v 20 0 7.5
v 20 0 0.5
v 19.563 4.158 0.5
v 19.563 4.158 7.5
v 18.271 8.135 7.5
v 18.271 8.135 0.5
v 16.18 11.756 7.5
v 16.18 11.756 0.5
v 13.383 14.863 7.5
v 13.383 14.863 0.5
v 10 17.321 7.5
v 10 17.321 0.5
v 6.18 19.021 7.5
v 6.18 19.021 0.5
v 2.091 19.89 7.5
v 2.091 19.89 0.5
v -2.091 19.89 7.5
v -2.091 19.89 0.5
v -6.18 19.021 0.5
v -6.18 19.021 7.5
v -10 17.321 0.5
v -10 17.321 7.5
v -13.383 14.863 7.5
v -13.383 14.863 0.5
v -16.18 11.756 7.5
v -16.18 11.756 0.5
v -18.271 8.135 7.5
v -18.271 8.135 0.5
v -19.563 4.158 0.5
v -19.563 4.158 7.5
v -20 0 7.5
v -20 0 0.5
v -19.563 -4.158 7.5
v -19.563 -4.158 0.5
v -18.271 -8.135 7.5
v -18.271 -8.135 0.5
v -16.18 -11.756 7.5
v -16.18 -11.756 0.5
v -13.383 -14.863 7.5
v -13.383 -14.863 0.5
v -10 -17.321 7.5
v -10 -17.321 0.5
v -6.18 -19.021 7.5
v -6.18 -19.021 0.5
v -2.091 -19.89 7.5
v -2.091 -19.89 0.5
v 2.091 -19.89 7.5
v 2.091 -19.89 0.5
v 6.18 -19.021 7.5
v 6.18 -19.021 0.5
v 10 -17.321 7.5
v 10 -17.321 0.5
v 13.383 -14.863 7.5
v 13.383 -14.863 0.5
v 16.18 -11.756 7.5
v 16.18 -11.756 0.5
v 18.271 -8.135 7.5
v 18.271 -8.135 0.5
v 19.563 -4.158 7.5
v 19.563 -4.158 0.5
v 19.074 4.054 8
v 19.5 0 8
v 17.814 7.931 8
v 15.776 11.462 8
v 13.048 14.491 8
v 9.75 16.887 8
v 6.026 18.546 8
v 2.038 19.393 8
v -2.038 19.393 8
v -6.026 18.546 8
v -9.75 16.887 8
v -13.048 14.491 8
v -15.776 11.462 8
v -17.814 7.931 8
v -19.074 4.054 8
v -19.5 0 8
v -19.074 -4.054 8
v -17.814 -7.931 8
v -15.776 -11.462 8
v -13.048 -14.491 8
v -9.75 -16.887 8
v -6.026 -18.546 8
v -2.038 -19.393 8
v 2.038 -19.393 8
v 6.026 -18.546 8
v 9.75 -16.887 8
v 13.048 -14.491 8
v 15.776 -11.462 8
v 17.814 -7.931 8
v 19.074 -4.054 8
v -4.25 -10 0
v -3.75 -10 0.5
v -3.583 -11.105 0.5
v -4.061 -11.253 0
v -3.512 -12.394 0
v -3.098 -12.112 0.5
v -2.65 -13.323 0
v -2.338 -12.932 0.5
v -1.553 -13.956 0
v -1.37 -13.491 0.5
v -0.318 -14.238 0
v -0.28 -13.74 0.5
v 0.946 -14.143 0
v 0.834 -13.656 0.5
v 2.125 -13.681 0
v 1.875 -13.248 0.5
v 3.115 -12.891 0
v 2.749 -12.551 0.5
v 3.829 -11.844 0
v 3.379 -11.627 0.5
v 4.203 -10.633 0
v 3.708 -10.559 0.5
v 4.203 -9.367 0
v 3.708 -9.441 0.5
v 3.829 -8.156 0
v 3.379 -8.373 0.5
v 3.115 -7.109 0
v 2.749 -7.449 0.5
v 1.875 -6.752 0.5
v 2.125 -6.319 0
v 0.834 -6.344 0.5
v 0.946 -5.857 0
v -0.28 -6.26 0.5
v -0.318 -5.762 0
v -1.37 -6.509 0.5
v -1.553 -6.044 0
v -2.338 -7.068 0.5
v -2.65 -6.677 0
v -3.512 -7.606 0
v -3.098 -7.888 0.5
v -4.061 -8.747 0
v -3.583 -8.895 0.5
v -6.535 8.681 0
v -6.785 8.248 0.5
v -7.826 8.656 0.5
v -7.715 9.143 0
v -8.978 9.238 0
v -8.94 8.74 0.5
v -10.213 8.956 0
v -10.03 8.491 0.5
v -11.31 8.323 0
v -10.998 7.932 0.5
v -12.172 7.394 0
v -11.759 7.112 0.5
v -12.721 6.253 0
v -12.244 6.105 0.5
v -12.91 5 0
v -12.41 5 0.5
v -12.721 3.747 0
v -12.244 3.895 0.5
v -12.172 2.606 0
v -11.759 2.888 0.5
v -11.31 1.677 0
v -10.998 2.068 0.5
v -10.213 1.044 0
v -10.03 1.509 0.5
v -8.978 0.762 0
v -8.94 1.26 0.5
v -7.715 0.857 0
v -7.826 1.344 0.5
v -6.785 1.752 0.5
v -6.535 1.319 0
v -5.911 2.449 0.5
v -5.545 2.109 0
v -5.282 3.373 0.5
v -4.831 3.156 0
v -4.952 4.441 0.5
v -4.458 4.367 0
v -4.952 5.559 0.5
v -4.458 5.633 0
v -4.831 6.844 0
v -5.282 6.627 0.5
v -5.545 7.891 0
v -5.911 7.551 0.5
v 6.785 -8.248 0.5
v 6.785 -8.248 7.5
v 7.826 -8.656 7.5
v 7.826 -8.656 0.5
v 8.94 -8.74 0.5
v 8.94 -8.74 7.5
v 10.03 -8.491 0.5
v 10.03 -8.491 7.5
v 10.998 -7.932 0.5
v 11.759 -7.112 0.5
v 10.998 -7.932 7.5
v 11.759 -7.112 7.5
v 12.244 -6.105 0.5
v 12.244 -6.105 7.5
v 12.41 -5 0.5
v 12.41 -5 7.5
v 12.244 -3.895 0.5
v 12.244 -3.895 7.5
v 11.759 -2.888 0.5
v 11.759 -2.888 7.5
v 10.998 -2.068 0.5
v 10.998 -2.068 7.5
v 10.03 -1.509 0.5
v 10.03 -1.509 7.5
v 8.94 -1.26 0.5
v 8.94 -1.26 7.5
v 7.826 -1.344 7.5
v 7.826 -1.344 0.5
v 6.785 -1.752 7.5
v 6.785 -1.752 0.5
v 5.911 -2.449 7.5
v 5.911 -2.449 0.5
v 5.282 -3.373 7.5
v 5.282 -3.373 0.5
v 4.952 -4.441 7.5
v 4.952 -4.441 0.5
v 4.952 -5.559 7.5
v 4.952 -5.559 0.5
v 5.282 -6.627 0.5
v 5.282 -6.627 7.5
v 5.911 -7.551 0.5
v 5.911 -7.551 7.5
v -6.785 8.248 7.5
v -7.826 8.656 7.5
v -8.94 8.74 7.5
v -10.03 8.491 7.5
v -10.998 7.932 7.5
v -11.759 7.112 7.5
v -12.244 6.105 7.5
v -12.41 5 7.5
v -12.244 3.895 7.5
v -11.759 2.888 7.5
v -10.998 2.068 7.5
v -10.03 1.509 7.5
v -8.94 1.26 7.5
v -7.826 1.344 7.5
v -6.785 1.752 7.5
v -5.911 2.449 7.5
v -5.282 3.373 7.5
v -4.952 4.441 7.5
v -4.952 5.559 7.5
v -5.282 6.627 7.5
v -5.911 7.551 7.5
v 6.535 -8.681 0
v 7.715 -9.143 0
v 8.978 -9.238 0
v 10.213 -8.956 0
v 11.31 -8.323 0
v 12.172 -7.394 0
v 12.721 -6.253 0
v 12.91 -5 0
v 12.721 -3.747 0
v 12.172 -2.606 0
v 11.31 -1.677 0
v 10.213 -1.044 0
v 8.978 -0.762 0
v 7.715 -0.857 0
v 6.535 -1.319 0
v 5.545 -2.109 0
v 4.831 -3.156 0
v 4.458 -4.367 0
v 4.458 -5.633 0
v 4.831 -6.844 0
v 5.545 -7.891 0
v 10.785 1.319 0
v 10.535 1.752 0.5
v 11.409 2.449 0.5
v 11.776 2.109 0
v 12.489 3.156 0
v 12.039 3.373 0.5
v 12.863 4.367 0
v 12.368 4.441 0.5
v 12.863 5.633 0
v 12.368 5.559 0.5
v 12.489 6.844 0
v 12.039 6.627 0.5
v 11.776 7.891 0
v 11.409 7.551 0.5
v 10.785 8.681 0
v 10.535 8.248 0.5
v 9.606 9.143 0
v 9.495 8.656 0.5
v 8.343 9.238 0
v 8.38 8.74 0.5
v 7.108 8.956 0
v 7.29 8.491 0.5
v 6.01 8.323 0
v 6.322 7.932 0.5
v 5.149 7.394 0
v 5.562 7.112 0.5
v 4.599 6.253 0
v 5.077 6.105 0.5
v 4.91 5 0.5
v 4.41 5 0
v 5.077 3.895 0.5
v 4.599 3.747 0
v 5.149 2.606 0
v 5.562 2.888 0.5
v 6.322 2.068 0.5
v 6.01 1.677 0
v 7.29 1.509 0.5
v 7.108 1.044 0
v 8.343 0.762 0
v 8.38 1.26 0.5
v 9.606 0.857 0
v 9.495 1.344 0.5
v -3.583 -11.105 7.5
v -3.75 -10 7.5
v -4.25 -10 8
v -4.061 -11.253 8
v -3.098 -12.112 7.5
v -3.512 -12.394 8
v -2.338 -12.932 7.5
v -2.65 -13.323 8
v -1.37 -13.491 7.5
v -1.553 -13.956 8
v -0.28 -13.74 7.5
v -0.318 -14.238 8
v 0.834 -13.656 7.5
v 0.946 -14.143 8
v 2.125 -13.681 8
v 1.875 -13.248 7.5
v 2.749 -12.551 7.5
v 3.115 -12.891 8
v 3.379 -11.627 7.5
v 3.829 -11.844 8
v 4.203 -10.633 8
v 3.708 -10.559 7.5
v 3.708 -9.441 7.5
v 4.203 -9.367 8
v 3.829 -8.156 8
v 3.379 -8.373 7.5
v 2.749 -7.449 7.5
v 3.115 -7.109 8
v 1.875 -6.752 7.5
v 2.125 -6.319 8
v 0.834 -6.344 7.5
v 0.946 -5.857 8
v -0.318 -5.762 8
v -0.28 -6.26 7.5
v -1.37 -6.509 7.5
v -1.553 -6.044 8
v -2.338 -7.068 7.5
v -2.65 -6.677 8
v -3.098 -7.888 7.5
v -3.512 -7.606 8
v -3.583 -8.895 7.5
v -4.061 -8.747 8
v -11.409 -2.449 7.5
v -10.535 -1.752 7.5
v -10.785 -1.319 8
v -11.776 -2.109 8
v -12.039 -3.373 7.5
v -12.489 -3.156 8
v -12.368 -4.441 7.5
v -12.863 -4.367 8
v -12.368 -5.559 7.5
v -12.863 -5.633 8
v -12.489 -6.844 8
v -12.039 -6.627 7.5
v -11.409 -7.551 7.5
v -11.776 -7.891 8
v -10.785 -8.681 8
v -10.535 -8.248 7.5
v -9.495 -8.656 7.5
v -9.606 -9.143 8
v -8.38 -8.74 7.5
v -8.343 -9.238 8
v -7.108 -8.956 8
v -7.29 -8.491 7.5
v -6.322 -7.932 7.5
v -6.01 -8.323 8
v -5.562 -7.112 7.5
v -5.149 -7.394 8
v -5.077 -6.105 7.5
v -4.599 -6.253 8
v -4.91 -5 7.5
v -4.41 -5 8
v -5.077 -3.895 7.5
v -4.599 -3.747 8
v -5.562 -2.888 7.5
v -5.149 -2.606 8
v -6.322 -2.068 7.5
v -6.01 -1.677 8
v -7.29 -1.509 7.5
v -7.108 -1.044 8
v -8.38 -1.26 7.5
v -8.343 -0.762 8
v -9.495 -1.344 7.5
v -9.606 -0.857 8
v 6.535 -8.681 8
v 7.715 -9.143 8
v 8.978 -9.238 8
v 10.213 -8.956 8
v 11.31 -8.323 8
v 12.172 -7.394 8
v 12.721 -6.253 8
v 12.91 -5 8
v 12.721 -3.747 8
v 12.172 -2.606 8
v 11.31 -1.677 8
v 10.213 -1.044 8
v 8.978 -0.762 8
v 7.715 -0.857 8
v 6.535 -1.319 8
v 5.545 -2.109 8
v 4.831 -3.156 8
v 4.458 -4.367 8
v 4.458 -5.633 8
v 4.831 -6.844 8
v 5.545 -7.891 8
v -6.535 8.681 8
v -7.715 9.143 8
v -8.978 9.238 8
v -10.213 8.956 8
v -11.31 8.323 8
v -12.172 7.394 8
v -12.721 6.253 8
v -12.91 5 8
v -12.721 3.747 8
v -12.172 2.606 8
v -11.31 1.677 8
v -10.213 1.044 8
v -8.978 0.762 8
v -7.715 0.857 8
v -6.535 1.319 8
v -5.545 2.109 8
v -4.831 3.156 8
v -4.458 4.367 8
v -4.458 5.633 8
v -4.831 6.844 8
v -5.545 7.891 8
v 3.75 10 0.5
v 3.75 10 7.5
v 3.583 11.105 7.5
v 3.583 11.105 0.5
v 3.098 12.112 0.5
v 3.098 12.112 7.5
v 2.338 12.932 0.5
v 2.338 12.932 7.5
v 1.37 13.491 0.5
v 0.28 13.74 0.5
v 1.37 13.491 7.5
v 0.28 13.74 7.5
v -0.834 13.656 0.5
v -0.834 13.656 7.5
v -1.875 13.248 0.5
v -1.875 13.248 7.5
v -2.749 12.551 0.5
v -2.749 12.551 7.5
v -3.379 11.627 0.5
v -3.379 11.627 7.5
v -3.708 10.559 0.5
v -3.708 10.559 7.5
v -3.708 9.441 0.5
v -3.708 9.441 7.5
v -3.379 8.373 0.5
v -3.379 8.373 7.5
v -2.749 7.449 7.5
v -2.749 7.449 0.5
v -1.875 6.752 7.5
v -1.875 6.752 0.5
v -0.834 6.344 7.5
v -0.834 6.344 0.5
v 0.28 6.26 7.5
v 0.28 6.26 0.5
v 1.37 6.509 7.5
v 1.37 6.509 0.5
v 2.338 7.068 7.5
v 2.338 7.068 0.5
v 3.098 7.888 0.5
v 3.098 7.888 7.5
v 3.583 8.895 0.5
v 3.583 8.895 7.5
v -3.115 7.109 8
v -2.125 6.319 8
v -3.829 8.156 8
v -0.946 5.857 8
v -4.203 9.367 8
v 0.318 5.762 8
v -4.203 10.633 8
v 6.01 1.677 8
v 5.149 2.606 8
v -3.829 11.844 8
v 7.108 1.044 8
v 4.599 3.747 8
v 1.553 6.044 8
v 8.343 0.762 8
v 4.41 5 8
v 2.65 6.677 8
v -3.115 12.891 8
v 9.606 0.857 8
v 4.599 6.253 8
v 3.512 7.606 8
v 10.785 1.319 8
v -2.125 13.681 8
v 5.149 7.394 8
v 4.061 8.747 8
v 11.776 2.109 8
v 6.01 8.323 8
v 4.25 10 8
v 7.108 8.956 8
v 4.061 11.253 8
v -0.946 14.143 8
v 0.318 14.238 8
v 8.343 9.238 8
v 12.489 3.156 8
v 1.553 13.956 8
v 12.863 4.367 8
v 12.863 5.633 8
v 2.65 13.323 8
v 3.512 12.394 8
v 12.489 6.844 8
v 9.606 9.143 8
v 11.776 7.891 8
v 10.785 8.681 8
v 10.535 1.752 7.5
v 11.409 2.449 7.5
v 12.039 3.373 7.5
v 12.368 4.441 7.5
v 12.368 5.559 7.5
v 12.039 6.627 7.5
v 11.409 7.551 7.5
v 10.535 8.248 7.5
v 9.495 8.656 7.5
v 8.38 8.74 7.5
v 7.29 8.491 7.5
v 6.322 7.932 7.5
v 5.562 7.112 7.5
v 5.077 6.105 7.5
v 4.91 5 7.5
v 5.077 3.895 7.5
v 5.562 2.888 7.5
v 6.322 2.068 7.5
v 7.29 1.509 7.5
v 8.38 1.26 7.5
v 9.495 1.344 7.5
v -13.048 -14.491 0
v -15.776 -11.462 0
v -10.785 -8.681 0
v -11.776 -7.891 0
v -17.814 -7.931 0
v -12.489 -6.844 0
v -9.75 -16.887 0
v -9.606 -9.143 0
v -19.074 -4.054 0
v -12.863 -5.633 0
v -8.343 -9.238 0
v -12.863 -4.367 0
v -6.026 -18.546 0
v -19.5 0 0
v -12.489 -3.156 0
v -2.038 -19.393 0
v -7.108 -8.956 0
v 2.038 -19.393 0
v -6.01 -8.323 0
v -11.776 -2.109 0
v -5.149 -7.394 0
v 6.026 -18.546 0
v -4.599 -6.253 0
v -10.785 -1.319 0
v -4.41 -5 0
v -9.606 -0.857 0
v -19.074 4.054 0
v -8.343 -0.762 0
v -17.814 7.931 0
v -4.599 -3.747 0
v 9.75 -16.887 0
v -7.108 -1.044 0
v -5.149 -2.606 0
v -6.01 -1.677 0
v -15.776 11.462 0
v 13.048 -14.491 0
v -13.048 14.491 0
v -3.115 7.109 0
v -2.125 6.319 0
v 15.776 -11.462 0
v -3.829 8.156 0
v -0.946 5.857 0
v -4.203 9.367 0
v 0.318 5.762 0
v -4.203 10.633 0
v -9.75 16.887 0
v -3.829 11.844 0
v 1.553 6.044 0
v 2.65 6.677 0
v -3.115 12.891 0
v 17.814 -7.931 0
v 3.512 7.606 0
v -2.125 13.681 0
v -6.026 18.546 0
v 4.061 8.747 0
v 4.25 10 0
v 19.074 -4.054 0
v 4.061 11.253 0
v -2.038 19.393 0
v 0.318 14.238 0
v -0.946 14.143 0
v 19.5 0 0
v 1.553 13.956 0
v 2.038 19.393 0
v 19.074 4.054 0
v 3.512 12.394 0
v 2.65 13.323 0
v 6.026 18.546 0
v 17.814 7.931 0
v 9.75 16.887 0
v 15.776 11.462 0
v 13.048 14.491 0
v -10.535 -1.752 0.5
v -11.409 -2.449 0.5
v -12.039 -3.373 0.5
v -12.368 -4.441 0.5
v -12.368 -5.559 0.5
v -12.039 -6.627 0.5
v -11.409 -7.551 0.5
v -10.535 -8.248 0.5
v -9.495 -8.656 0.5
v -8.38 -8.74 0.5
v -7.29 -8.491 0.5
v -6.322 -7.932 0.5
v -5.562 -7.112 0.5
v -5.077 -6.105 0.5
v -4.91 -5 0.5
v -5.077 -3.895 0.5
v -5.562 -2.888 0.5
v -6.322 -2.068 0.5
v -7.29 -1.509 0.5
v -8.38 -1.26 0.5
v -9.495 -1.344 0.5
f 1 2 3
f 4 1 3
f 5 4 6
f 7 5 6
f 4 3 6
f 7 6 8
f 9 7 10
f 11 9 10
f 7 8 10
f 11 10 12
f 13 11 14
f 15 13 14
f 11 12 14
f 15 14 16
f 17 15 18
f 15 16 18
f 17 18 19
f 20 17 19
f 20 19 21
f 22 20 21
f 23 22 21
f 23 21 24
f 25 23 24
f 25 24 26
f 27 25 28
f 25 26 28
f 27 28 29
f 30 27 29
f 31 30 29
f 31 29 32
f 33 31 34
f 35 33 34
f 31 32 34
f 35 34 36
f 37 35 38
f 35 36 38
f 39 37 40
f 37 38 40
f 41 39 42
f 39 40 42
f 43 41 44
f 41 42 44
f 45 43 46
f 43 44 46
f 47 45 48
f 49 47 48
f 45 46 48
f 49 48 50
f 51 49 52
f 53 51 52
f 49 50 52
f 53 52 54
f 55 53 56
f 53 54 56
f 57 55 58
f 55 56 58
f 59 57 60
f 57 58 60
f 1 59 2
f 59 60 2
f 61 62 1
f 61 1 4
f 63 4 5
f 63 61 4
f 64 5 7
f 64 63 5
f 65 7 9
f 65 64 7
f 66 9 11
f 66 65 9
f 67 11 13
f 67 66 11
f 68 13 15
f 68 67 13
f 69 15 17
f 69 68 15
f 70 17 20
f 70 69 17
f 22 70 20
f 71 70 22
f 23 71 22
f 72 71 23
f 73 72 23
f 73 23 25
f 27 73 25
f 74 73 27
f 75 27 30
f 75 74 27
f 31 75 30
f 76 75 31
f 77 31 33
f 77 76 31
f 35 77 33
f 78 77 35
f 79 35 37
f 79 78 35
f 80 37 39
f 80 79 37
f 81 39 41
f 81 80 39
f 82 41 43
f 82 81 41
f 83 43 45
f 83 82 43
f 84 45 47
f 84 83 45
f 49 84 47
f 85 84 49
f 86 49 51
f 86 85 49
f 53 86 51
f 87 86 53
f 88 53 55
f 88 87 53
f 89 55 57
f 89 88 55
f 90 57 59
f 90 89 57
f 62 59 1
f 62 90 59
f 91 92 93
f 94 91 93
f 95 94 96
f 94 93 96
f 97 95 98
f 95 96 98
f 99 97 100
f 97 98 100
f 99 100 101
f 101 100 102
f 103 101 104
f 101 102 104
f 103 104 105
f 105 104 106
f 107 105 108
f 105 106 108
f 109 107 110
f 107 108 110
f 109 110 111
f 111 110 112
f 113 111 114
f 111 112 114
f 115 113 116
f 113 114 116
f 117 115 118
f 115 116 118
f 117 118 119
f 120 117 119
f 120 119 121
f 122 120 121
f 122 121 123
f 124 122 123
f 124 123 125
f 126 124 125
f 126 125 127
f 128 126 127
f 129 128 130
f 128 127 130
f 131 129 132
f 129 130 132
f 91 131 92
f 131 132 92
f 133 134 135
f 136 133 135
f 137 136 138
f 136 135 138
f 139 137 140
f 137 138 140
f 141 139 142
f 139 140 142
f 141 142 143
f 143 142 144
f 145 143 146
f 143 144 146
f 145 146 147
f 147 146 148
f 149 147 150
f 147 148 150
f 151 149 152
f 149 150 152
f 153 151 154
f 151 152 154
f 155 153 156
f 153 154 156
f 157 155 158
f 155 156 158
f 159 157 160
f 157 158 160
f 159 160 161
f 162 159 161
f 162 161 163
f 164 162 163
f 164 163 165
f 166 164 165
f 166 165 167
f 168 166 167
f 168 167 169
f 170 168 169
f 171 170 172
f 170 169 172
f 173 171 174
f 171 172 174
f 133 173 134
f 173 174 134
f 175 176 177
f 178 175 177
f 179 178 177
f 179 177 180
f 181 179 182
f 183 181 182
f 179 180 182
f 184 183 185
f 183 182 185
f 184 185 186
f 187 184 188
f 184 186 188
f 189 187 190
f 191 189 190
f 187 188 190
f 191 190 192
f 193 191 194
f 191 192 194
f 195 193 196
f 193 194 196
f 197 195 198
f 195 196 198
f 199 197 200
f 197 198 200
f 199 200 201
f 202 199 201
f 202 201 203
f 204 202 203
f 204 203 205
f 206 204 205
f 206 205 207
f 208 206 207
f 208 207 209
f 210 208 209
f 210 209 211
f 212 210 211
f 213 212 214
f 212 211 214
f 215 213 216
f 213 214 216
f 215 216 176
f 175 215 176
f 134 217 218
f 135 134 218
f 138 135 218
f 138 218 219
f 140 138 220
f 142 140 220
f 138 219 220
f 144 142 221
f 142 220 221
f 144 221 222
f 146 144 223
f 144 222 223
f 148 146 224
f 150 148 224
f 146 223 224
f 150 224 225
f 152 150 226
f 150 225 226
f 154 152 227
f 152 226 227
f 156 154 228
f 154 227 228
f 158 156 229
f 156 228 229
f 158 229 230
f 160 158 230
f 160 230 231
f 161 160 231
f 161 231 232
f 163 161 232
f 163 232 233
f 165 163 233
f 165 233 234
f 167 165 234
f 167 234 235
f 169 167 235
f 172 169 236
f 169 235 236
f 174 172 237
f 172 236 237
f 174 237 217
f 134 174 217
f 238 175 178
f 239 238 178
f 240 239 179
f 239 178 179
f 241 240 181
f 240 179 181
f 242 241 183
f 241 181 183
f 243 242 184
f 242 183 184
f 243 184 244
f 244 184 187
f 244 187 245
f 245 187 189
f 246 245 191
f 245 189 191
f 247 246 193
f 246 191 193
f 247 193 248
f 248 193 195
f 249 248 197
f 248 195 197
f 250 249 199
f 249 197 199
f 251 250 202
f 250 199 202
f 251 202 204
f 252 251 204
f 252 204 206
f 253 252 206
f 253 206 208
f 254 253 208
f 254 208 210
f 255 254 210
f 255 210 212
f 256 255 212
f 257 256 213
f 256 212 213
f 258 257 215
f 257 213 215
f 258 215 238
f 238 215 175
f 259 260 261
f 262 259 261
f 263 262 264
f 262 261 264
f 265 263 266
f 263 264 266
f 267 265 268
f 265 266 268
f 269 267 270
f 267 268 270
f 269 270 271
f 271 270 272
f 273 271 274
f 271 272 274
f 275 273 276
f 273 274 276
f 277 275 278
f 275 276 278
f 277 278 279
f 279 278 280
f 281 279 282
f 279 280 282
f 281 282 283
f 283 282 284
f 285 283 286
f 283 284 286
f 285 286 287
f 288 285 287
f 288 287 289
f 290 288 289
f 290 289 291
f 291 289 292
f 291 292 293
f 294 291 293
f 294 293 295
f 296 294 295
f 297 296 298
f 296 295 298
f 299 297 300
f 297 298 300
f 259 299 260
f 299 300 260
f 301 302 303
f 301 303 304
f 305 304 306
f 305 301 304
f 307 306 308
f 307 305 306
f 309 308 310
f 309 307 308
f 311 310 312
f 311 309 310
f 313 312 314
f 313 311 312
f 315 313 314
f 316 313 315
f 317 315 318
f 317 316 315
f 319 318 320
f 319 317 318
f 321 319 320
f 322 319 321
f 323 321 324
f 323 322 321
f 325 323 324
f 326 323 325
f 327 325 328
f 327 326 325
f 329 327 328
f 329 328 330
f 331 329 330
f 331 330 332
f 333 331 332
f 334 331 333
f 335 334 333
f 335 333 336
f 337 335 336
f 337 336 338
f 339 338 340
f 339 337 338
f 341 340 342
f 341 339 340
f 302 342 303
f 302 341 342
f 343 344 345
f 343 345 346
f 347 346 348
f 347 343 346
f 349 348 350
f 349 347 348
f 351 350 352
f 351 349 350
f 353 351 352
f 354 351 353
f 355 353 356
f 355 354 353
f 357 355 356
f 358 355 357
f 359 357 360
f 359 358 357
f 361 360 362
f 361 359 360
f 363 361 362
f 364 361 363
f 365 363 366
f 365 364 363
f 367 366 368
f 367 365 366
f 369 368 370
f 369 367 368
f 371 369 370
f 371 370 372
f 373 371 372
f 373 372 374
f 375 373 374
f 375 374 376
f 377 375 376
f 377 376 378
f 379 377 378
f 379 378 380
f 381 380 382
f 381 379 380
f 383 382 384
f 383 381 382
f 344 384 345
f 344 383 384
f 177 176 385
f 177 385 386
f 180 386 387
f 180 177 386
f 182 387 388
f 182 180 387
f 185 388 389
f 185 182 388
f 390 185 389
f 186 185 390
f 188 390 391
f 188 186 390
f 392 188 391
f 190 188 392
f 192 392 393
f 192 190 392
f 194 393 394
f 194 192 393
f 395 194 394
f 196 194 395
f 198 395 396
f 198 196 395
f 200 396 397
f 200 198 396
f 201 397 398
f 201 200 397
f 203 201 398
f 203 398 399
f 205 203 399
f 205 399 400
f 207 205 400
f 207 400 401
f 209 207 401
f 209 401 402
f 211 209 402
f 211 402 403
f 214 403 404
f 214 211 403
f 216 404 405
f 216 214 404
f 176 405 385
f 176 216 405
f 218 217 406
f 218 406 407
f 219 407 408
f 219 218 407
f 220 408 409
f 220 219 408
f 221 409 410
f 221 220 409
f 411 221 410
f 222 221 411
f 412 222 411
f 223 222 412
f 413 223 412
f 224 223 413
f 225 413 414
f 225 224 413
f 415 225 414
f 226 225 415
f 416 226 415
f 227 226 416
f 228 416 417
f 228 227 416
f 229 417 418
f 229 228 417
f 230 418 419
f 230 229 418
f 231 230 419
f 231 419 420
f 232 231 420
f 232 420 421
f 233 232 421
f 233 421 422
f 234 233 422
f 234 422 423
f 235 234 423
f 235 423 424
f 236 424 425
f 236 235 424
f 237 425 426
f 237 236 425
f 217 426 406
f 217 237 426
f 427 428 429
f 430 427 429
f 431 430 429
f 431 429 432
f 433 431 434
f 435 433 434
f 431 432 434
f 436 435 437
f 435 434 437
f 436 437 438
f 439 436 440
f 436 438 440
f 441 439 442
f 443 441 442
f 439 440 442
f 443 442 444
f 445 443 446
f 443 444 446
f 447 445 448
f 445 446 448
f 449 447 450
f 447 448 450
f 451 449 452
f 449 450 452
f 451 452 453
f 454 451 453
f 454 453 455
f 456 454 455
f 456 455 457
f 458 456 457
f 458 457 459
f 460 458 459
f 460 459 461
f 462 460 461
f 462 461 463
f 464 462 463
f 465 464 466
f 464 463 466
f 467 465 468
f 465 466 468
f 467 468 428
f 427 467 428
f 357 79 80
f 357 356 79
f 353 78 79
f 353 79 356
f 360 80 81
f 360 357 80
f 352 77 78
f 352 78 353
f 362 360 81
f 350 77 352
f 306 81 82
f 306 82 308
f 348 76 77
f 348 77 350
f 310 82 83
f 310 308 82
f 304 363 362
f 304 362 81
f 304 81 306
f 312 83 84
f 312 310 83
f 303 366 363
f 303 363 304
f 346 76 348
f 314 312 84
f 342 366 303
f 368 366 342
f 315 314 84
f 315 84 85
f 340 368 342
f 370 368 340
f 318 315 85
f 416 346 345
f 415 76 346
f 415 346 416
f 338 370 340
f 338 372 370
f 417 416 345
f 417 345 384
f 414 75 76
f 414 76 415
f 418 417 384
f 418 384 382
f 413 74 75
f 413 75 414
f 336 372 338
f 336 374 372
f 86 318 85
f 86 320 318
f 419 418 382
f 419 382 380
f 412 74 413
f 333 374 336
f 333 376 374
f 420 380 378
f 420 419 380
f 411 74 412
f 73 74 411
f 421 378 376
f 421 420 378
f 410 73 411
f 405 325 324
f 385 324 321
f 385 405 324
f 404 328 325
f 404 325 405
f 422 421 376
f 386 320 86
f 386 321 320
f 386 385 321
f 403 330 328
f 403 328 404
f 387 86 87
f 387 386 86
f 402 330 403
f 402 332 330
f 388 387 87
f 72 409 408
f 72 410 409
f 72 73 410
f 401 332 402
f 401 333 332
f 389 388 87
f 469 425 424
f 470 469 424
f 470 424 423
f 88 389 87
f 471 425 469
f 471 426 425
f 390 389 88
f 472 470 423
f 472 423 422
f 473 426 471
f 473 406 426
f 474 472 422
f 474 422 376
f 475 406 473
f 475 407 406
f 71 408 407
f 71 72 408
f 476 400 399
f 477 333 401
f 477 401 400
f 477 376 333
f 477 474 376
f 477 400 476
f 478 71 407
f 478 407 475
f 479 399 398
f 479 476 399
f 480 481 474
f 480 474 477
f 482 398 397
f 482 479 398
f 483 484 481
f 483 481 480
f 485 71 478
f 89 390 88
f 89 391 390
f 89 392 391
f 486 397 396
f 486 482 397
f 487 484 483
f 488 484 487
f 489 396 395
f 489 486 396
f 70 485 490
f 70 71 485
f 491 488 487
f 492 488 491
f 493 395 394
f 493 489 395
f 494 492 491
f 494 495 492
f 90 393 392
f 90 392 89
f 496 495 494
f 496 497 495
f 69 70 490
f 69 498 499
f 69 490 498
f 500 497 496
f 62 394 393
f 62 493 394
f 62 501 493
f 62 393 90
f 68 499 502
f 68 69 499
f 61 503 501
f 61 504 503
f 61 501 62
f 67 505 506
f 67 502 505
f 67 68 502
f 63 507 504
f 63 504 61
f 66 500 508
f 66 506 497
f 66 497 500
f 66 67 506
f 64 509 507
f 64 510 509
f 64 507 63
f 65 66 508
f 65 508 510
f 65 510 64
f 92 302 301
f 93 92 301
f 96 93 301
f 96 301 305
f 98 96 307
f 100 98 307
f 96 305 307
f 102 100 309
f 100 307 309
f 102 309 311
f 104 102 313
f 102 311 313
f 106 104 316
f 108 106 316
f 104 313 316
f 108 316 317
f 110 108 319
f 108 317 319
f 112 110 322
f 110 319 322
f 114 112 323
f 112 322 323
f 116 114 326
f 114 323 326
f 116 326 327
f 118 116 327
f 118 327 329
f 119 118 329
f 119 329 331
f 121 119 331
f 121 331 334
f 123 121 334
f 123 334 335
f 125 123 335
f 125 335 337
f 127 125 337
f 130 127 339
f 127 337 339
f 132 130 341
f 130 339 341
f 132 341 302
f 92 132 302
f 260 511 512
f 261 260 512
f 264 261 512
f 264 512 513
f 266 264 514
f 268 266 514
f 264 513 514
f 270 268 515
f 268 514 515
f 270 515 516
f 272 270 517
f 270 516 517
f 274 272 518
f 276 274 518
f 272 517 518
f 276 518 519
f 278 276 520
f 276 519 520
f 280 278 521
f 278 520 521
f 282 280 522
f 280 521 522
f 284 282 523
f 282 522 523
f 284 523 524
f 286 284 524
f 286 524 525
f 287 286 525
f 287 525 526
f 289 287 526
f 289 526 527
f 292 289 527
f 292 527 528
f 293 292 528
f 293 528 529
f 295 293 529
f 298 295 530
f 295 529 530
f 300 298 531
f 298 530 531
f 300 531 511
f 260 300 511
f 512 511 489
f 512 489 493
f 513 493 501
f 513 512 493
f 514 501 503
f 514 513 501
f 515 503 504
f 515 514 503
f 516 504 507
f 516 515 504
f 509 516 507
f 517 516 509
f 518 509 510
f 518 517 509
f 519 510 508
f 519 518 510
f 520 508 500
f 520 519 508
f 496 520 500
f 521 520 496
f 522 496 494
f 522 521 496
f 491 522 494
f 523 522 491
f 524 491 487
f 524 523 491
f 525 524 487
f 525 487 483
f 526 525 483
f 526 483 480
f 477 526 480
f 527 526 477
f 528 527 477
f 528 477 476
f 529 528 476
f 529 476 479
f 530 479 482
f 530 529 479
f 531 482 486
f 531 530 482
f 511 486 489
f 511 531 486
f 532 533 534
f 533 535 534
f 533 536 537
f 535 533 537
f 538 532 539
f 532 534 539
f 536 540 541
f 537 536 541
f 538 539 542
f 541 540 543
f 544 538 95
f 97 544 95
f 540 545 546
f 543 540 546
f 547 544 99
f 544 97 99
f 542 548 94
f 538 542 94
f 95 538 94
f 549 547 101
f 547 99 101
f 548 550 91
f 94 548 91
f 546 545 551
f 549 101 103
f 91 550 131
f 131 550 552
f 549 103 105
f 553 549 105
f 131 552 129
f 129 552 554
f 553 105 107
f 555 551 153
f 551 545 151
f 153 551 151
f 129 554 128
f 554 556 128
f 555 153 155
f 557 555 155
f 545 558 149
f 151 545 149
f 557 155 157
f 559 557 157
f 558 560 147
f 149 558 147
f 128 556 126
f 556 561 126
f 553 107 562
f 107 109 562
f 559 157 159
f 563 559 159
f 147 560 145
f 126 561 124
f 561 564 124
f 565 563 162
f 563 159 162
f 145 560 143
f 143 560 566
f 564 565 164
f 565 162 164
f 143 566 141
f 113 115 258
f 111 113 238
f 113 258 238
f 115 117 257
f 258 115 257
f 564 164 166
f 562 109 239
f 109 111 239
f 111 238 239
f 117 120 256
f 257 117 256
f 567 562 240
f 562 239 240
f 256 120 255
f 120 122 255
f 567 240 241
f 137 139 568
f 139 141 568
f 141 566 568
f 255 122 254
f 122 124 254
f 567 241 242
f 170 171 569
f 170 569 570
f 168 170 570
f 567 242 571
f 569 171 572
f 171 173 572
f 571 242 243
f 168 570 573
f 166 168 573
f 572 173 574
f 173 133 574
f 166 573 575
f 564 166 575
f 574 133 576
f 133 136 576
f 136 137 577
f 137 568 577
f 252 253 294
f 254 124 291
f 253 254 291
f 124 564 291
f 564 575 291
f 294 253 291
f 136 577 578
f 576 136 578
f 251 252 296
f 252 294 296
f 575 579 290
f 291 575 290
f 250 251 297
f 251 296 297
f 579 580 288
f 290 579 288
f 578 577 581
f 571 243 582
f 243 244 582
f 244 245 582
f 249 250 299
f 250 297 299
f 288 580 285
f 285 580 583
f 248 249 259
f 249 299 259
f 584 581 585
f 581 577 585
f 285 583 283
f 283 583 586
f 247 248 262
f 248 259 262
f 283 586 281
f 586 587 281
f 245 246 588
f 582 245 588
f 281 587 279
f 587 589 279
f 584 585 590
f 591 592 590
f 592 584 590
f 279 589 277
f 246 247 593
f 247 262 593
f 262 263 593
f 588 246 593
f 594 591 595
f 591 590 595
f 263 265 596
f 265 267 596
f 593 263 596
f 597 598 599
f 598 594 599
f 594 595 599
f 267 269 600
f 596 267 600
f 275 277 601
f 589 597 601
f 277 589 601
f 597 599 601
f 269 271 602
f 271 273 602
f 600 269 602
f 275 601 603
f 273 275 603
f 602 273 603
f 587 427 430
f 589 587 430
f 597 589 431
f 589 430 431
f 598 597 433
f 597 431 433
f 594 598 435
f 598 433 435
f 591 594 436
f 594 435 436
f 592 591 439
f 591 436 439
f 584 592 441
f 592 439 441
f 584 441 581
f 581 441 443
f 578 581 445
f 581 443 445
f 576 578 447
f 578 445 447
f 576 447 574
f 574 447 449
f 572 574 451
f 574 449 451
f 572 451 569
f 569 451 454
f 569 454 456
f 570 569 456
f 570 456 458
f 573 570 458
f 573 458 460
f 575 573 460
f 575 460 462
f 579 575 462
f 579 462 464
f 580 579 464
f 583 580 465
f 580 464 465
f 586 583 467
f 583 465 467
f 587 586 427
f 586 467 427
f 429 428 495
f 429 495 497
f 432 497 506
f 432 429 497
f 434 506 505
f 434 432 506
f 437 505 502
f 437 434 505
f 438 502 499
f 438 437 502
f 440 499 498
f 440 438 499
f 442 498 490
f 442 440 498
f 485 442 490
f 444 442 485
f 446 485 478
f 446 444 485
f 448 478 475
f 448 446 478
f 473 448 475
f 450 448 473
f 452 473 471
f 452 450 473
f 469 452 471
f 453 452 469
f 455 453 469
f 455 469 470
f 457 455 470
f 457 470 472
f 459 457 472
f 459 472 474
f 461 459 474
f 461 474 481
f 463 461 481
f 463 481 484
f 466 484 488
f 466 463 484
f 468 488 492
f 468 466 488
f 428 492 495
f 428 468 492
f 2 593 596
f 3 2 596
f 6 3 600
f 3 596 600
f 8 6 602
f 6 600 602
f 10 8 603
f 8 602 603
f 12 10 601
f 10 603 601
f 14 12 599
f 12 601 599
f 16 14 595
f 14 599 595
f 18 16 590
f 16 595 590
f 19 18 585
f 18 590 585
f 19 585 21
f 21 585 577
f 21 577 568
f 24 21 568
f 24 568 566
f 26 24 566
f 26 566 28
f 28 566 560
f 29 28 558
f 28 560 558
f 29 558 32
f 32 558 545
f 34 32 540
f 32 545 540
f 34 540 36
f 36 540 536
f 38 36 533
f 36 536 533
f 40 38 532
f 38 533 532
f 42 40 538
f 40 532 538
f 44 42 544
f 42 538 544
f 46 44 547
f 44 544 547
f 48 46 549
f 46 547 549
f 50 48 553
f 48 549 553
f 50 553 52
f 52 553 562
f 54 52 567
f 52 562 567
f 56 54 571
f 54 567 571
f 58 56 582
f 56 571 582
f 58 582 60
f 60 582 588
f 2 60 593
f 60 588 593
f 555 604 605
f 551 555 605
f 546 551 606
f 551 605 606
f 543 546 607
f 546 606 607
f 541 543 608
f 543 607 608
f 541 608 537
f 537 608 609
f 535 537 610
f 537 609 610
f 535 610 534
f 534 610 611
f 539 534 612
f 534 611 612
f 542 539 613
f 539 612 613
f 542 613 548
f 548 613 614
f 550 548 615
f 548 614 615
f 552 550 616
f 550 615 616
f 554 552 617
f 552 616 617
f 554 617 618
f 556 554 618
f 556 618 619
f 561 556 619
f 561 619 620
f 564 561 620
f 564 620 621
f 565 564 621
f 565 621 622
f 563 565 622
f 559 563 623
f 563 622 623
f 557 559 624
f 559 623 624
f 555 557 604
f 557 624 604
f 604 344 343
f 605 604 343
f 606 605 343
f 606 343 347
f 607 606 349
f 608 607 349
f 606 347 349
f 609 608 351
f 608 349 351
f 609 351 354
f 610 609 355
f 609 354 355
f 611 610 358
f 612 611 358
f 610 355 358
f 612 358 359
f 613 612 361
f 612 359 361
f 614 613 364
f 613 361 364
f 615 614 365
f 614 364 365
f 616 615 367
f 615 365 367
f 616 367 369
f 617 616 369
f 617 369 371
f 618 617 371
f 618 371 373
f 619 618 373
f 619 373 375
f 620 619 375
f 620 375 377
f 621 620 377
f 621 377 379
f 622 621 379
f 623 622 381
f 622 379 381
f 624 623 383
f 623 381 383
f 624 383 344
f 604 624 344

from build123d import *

# Parameters (mm, degrees)
SKETCH3_R           = 20
BOSS_EXTRUDE1_DEPTH = 8
SKETCH4_R           = 3.75
CUT_EXTRUDE1_DEPTH  = 8
CIRPATTERN1_COUNT   = 6
CHAMFER1_SIZE       = 0.5


with BuildPart() as part:
    # Sketch3 → Boss-Extrude1 (new body)
    with BuildSketch(Plane.XY):
        Circle(SKETCH3_R)
    extrude(amount=BOSS_EXTRUDE1_DEPTH)

    # Sketch4 → Cut-Extrude1 (cut)
    with BuildSketch(Plane.XY.offset(8)):
        with Locations((0, 10)):
            Circle(SKETCH4_R)
    cut_extrude1 = extrude(amount=-CUT_EXTRUDE1_DEPTH, mode=Mode.SUBTRACT)

    # CirPattern1: Cut-Extrude1 ×6 about axis
    cirpattern1_axis = Axis((0, 0, 0), (0, 0, 1))
    for i in range(1, CIRPATTERN1_COUNT):
        add(cut_extrude1.rotate(cirpattern1_axis, i * 360 / CIRPATTERN1_COUNT), mode=Mode.SUBTRACT)

    # Chamfer1
    chamfer1_edges = [part.edges().sort_by_distance(p)[0] for p in [
        (-10.535254038, 1.752404736, 0),
        (-10.535254038, 1.752404736, 8),
        (-6.785254038, -8.247595264, 0),
        (-6.785254038, -8.247595264, 8),
        (3.75, -10, 0),
        (-20, 0, 0),
        (3.75, -10, 8),
        (10.535254038, -1.752404736, 0),
        (10.535254038, -1.752404736, 8),
        (6.785254038, 8.247595264, 0),
        (6.785254038, 8.247595264, 8),
        (-20, 0, 8),
        (-3.75, 10, 0),
        (-3.75, 10, 8),
    ]]
    chamfer(chamfer1_edges, length=CHAMFER1_SIZE)


solid = part.part
